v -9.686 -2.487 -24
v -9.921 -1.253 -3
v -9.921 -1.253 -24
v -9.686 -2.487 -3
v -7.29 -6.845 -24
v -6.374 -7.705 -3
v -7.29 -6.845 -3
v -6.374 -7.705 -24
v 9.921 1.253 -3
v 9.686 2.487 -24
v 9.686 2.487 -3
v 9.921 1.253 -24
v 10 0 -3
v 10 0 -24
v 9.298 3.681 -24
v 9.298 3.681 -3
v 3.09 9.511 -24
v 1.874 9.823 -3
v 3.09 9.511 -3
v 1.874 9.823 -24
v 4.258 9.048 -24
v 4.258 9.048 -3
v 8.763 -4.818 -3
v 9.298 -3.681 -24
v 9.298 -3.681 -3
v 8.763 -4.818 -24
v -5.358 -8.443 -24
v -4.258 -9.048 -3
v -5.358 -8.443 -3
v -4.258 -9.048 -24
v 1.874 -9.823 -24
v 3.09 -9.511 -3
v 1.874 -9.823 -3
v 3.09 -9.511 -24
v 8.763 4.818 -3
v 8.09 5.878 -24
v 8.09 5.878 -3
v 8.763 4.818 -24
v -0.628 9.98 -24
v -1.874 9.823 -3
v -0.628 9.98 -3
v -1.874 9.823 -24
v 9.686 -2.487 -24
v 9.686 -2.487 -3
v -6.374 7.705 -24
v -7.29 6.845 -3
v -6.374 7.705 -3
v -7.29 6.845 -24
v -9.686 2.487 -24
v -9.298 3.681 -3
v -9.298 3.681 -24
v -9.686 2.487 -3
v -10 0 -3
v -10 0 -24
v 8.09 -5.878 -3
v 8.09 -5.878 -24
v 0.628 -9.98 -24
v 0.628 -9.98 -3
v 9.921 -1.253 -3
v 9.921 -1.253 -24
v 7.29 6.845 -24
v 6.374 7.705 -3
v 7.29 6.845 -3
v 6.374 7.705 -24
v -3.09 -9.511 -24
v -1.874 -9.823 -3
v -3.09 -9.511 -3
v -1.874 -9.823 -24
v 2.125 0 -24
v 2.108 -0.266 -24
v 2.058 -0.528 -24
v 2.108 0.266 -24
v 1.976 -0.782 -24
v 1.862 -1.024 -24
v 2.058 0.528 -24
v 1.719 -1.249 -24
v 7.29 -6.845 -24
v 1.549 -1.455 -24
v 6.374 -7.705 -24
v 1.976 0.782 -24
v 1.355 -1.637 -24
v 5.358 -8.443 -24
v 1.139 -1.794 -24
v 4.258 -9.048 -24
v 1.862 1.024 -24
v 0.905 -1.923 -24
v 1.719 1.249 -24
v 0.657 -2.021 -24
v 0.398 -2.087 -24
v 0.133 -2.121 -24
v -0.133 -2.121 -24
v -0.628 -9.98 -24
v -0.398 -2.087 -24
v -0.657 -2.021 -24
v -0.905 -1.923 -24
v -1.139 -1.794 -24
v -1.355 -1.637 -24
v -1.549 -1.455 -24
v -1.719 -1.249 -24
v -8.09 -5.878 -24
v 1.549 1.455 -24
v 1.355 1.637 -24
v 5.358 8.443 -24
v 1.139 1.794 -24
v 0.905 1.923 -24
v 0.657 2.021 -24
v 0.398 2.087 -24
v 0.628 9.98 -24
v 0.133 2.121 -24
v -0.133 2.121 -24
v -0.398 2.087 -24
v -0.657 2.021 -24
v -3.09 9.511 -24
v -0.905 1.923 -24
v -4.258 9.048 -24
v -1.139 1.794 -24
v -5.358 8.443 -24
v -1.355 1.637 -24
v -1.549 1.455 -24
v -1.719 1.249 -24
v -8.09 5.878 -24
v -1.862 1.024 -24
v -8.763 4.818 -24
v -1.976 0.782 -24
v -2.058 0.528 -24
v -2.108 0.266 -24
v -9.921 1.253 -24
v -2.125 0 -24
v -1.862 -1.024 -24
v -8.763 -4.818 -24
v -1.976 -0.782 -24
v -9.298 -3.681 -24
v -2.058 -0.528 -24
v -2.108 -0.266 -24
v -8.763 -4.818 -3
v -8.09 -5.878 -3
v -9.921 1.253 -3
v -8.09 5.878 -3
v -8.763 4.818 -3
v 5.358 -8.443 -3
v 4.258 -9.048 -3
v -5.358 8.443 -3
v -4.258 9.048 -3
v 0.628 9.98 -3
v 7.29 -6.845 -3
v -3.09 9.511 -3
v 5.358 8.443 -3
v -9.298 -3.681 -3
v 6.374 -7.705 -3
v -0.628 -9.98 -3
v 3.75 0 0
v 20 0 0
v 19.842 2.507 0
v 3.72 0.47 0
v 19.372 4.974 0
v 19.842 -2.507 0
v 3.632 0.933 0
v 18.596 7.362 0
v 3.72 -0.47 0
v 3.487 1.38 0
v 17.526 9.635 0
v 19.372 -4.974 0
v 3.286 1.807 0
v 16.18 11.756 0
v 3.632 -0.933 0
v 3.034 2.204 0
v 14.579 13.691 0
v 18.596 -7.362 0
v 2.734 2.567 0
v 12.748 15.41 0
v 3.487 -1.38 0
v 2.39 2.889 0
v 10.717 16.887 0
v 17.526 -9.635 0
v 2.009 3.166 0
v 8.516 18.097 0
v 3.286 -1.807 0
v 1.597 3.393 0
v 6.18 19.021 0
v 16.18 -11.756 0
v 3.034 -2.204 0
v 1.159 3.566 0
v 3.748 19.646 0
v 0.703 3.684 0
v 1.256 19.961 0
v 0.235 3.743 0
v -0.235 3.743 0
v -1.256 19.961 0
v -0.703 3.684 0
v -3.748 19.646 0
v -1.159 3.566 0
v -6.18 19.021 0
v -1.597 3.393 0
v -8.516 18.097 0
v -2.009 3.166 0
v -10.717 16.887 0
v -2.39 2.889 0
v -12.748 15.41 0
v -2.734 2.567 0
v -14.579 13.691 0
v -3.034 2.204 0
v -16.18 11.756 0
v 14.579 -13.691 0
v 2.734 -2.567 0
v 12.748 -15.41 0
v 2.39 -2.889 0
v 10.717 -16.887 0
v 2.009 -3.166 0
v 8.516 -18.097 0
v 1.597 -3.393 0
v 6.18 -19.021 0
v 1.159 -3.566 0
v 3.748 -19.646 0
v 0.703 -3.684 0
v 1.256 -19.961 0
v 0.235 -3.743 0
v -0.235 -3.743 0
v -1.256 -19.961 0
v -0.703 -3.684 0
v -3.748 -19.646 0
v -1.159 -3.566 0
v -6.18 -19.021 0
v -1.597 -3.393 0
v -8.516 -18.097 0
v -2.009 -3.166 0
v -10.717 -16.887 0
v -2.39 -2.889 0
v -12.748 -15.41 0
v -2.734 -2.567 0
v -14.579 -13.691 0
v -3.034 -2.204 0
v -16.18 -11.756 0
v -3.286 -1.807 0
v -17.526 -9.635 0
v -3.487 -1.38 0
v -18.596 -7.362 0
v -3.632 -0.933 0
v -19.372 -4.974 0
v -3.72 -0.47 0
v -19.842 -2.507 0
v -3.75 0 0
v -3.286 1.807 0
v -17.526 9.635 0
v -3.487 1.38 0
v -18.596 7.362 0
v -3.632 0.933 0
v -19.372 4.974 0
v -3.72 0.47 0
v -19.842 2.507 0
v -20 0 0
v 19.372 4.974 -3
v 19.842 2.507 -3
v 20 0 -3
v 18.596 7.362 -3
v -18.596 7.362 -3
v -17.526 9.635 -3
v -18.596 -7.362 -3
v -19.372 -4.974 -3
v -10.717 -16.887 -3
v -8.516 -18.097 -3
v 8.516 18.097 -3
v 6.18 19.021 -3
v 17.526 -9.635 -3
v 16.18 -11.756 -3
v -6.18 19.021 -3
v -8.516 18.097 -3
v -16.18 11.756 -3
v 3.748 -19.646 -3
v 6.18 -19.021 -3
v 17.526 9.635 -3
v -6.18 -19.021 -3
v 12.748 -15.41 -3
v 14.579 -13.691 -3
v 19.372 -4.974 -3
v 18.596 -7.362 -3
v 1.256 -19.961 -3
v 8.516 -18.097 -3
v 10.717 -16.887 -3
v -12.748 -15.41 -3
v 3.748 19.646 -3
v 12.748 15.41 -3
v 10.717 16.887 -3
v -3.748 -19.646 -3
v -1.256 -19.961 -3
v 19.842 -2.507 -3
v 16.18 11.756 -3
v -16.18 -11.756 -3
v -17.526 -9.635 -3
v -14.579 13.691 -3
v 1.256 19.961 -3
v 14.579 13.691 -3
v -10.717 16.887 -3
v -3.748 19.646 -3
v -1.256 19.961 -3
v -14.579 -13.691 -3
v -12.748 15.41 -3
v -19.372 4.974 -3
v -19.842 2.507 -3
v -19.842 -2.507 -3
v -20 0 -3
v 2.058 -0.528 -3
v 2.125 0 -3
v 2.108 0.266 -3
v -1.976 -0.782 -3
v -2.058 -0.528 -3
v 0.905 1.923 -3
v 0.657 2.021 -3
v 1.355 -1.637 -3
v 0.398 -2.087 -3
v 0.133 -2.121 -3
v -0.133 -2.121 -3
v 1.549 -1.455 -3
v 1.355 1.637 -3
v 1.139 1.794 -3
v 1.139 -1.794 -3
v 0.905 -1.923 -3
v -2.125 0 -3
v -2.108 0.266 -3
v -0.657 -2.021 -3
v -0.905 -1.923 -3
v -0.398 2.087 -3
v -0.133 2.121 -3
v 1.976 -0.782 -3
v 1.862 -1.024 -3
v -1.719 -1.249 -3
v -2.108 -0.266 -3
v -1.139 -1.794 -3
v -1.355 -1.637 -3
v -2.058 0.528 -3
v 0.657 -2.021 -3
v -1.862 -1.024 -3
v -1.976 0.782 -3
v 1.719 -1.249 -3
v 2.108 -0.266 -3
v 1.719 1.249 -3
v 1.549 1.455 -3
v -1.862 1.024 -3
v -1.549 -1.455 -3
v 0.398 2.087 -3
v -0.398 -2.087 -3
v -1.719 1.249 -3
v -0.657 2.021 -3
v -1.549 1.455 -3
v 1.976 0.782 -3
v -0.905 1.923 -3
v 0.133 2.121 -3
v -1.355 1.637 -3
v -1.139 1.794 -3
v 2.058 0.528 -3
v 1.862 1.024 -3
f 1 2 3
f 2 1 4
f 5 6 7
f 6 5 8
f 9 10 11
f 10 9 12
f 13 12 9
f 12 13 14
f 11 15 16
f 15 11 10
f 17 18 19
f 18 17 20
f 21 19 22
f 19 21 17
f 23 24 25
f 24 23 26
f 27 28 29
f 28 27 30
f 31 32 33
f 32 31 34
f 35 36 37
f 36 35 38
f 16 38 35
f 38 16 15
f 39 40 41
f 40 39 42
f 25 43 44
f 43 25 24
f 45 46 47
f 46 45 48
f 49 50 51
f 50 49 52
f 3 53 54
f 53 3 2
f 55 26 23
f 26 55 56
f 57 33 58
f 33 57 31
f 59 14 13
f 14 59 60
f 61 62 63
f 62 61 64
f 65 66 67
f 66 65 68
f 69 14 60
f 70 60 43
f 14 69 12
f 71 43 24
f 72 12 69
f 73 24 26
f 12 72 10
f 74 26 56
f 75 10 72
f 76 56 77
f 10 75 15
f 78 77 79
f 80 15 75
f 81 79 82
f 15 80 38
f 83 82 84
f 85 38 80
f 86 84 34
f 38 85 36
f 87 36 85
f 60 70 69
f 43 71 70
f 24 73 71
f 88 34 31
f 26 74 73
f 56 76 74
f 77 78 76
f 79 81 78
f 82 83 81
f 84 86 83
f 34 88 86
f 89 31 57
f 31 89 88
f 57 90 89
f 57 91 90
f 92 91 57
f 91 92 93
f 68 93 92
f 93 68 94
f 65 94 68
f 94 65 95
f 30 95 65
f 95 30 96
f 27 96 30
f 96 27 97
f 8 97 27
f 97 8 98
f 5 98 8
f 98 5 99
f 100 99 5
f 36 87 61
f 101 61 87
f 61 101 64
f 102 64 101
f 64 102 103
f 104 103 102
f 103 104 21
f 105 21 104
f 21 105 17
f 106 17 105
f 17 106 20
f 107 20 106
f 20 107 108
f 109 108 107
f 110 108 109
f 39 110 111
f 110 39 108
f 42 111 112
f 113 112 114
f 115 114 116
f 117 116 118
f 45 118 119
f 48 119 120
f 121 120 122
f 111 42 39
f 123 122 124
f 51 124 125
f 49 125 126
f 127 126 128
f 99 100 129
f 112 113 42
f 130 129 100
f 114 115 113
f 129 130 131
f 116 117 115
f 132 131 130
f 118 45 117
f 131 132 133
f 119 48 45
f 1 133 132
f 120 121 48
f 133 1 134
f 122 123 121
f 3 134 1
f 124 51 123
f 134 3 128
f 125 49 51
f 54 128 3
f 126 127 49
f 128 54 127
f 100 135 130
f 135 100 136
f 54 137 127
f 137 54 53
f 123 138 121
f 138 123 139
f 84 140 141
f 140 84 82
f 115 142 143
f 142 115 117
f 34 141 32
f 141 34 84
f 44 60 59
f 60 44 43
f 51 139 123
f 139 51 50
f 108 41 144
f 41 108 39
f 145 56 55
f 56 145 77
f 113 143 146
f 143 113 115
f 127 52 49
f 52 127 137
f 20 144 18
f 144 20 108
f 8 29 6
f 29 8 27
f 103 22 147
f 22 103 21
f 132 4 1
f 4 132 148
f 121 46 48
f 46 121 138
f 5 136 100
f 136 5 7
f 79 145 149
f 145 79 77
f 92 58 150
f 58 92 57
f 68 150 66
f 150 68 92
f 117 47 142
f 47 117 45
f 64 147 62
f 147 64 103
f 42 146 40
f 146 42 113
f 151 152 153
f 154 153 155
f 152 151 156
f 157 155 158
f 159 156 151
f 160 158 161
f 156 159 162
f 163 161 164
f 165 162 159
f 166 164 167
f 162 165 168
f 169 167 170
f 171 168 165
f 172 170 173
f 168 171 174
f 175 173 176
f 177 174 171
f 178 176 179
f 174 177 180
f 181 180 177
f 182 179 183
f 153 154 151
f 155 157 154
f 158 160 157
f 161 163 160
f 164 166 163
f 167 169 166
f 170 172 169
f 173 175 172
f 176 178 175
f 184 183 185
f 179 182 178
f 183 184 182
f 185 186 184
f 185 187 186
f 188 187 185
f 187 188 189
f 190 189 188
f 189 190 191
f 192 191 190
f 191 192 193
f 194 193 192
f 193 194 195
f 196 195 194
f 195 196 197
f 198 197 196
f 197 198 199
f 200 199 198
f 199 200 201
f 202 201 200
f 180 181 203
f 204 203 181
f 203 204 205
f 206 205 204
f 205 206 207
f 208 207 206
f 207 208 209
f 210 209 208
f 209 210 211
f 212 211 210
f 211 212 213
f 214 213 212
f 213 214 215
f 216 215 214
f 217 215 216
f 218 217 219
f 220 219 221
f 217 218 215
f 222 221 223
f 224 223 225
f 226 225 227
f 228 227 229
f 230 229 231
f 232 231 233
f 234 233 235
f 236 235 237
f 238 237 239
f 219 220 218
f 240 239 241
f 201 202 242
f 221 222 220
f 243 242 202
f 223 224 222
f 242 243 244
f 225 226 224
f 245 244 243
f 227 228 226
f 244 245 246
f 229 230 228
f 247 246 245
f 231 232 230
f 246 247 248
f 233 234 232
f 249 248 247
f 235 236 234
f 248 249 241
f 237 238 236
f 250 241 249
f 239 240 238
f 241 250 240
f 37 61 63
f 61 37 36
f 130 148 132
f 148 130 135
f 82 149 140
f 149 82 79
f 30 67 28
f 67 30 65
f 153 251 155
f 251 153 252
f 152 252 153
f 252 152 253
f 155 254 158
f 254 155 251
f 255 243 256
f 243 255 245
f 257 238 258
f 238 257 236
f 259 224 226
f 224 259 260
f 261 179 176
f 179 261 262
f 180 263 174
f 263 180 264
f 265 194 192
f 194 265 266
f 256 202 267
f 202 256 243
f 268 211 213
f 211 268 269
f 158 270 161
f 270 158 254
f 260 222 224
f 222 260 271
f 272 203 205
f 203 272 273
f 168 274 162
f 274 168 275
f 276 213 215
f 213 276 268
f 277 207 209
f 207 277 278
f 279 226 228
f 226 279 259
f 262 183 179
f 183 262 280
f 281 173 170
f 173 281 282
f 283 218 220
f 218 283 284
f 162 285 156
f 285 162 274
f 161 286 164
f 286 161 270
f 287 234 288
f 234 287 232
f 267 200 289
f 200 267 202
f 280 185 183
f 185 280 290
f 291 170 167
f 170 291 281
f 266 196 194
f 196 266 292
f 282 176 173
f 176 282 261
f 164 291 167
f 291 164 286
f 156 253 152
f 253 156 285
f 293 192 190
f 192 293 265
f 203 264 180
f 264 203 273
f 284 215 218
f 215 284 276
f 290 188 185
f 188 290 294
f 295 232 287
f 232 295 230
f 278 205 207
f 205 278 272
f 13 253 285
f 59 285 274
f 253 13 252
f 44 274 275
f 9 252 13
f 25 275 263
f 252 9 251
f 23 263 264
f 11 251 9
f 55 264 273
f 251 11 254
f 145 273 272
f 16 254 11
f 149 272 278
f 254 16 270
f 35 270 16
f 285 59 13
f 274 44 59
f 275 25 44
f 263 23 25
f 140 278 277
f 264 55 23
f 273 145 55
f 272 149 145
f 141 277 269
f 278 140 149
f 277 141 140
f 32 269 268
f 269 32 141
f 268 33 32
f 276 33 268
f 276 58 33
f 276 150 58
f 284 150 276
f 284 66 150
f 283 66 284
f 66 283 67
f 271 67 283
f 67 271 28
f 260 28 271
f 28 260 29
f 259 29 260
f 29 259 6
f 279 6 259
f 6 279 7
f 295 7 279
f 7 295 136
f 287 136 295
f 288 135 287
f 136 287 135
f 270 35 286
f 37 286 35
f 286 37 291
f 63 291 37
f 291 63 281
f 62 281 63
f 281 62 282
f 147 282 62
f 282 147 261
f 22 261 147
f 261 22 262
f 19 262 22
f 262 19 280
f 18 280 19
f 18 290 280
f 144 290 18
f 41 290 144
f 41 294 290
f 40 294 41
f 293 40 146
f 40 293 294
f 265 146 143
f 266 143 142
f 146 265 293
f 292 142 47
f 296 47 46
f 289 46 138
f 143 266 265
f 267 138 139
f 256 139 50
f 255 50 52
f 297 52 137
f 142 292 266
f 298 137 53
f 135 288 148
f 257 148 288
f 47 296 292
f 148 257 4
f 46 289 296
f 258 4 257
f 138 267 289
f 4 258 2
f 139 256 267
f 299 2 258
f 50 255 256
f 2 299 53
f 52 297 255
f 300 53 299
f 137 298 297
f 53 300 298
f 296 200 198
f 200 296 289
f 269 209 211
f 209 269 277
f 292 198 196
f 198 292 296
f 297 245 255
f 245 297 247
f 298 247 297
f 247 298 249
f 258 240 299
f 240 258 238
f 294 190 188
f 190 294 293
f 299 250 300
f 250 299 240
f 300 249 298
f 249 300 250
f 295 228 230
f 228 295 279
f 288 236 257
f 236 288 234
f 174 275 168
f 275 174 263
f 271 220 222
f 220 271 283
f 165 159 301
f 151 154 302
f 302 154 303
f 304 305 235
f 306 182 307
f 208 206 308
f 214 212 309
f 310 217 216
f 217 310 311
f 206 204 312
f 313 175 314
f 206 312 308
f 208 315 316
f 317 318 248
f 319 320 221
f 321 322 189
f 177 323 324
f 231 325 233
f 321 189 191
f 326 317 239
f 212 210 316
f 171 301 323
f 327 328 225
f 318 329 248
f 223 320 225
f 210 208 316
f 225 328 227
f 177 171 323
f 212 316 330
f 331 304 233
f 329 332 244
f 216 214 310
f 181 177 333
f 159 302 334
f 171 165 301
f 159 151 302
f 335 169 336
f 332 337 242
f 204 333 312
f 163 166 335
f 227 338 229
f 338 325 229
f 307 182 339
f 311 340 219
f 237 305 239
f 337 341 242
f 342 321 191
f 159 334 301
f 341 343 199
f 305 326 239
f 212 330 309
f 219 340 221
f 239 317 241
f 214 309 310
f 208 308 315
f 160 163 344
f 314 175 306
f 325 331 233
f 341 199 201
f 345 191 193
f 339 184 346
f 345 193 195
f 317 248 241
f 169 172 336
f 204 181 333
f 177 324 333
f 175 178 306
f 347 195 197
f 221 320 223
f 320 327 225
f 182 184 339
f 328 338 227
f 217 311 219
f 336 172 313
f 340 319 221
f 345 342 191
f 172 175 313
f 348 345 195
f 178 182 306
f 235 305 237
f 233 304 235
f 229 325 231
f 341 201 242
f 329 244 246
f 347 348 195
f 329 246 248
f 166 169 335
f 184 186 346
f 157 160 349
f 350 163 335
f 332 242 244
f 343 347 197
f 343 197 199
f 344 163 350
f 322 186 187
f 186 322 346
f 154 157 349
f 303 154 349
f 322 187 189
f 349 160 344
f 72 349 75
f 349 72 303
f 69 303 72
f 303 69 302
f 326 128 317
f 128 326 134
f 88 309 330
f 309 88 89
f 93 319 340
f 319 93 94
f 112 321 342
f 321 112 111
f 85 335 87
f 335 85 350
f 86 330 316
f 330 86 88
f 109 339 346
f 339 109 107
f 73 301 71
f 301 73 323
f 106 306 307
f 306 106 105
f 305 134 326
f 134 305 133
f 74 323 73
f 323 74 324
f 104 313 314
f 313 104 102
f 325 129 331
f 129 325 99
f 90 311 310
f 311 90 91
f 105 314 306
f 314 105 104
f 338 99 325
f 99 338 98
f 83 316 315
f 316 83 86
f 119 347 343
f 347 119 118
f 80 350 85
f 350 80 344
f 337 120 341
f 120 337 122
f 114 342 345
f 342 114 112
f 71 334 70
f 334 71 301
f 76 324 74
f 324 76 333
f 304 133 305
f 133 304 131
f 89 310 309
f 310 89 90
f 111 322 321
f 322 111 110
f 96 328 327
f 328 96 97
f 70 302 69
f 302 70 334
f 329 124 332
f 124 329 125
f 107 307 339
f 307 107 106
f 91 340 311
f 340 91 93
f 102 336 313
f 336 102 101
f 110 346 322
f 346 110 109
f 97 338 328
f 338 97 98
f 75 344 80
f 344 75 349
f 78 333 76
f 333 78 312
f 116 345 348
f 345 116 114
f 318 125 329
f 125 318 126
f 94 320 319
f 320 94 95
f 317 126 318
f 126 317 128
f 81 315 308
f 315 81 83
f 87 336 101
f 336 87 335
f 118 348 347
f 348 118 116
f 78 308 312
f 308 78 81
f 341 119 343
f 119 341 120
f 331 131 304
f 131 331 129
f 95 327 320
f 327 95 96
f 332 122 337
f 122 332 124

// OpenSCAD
$fn = 50;


difference() {
	union() {
		translate(v = [0, 0, -24.0000000000]) {
			cylinder(h = 24, r = 10.0000000000);
		}
		translate(v = [0, 0, -3.0000000000]) {
			cylinder(h = 3, r = 20.0000000000);
		}
	}
	union() {
		translate(v = [0, 0, 0]) {
			rotate(a = [0, 0, 0]) {
				difference() {
					union() {
						#translate(v = [0, 0, -24.0000000000]) {
							cylinder(h = 24, r = 2.0000000000);
						}
						#translate(v = [0, 0, -3]) {
							cylinder(h = 3, r1 = 2.1250000000, r2 = 3.7500000000);
						}
						#translate(v = [0, 0, -24.0000000000]) {
							cylinder(h = 24, r = 2.1250000000);
						}
						#translate(v = [0, 0, -24.0000000000]) {
							cylinder(h = 24, r = 2.0000000000);
						}
					}
					union();
				}
			}
		}
	}
}
